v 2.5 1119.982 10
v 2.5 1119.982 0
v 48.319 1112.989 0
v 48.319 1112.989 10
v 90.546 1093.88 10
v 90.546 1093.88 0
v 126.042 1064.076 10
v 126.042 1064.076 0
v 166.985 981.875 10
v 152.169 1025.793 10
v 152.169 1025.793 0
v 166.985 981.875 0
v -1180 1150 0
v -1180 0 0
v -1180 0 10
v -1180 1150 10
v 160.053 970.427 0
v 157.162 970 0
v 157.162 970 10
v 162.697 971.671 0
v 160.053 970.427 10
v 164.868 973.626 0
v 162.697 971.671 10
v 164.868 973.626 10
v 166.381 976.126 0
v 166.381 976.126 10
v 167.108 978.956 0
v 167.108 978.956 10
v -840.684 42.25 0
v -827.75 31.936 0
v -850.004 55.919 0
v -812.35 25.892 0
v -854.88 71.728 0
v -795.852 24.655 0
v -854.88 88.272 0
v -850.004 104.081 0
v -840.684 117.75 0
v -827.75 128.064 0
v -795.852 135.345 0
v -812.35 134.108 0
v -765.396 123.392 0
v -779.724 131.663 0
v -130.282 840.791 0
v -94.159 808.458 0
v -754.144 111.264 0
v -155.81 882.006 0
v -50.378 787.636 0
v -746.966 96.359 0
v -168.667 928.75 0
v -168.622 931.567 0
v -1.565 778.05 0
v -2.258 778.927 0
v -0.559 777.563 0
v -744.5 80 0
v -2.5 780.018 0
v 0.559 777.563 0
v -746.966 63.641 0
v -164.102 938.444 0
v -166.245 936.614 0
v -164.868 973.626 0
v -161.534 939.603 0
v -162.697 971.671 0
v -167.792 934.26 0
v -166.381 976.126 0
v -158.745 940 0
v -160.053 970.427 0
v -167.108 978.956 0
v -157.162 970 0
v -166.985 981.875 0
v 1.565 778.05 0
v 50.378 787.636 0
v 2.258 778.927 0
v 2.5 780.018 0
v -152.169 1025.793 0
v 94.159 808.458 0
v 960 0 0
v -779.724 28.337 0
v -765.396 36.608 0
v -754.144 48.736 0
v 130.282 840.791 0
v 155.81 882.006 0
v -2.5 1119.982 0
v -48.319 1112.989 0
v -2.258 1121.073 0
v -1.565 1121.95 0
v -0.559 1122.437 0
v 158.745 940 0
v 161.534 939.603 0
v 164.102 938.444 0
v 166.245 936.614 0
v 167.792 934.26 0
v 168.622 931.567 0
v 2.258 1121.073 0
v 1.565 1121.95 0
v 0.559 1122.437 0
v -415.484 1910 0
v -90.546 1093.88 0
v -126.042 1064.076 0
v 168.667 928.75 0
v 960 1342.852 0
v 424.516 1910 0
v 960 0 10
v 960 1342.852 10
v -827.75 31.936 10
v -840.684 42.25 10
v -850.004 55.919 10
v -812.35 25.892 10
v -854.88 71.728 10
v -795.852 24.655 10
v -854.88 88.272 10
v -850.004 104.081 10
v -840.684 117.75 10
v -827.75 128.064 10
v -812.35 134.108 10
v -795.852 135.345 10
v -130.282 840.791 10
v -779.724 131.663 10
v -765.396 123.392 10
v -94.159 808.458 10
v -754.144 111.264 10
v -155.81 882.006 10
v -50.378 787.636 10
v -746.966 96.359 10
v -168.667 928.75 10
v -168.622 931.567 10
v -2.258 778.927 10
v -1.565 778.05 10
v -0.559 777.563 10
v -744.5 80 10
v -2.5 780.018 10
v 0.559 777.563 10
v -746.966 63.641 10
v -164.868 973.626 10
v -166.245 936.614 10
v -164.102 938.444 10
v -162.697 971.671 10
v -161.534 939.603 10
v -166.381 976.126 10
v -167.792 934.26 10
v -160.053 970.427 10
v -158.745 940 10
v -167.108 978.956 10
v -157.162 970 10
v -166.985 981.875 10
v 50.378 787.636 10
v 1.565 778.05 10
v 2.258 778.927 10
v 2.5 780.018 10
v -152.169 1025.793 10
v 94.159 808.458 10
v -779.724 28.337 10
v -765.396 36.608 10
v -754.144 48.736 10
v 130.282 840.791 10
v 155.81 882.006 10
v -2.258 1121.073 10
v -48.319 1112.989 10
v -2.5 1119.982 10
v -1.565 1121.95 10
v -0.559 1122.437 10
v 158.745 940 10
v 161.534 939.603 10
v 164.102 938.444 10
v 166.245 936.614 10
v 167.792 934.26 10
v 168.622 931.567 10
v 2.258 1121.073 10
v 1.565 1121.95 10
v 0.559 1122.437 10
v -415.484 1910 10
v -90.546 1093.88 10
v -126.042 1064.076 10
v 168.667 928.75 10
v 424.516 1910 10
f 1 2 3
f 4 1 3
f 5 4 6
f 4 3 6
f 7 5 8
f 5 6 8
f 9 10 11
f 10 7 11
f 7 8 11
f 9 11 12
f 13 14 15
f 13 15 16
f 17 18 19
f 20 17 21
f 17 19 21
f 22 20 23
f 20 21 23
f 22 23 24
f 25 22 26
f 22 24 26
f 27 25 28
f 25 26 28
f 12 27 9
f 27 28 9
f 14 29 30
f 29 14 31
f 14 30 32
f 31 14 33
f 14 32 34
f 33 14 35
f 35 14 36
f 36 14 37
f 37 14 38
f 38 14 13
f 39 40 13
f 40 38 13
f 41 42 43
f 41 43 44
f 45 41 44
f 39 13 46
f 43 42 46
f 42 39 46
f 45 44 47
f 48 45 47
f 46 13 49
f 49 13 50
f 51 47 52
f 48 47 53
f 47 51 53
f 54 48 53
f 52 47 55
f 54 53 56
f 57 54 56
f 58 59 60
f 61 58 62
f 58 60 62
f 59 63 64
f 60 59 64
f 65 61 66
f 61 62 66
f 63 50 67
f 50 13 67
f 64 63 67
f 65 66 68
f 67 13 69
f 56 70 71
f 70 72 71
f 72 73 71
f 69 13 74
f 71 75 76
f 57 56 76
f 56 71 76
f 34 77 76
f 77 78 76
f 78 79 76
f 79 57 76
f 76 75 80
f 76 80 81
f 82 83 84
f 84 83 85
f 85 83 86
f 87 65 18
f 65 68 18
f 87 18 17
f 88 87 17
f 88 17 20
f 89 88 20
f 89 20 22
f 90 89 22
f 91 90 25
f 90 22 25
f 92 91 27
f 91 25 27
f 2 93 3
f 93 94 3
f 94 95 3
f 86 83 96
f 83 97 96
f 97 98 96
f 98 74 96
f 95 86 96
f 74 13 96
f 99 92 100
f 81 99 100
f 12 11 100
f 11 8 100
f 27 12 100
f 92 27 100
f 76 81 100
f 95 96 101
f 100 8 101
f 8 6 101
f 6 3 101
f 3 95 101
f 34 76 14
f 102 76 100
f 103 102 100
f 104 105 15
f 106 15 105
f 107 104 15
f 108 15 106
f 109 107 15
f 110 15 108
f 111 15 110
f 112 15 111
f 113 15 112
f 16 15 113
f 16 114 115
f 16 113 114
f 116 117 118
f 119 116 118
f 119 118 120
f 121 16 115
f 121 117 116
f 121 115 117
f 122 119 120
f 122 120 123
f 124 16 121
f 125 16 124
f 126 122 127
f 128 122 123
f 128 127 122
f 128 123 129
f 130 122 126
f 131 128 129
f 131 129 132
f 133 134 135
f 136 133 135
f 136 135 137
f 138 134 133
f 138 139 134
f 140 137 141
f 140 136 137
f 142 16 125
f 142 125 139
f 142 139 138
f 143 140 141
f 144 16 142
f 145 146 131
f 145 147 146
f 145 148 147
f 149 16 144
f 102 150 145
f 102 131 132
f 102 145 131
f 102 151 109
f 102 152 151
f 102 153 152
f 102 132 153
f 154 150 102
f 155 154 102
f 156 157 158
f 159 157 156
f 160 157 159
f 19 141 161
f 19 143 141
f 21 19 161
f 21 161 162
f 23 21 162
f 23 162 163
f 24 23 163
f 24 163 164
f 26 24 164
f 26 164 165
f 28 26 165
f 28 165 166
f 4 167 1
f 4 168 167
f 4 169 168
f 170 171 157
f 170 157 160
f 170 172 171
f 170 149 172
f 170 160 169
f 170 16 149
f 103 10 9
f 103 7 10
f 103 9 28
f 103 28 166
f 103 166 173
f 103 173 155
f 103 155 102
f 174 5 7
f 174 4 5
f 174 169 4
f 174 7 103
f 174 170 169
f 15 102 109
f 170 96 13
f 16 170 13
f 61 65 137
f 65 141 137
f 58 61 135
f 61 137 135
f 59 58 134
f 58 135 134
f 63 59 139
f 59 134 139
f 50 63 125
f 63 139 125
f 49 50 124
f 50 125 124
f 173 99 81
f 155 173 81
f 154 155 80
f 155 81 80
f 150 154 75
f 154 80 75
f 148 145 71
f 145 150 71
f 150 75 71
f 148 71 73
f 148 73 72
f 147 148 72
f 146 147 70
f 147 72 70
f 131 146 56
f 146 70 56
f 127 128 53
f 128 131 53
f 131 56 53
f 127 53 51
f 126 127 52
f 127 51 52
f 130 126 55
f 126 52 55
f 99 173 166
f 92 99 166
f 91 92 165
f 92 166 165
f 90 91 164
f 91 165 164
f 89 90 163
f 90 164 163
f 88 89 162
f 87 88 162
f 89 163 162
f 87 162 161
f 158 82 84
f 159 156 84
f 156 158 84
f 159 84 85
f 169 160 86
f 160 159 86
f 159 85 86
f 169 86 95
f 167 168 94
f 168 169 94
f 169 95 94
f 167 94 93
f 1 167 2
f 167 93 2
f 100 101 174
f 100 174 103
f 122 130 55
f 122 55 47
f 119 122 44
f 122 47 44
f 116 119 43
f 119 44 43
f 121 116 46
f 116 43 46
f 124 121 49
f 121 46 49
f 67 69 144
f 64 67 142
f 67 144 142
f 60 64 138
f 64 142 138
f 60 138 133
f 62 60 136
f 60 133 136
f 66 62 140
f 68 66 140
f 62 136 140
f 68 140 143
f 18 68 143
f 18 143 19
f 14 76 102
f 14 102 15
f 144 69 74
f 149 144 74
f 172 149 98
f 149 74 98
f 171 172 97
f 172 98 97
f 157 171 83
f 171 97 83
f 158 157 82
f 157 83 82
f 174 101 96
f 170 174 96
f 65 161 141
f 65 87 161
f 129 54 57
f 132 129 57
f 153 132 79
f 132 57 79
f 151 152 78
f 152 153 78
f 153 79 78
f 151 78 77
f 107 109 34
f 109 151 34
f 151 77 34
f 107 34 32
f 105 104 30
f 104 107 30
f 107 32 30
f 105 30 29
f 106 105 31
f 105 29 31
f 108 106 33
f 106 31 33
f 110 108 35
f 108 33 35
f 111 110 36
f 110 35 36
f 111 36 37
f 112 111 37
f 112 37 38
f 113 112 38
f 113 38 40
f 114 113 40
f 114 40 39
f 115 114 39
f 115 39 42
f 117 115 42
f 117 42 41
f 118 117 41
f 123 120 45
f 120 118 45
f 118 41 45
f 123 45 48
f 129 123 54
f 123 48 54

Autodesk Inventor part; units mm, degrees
ref_plane "YZ Plane" through (0, 0, 0) normal (1, 0, 0) x (0, 1, 0)
ref_plane "XZ Plane" through (0, 0, 0) normal (0, 1, 0) x (-1, 0, 0)
ref_plane "XY Plane" through (0, 0, 0) normal (0, 0, 1) x (1, 0, 0)
sketch "Sketch1" plane through (0, 0, 0) normal (0, 0, 1) x (1, 0, 0)
  line L0 (0, 0) -> (0, 1910) construction
  line L1 (424.5155, 1910) -> (-415.4845, 1910)
  line L2 (-415.4845, 1910) -> (-1180, 1150)
  line L3 (-1180, 0) -> (-1180, 1150)
  line L4 (960, 0) -> (960, 1342.8524)
  line L5 (424.5155, 1910) -> (960, 1342.8524)
  circle A0 centre (0, 950) radius 265 construction
  line L6 (960, 0) -> (-1180, 0)
  circle A1 centre (-1701.6377, -269.2167) radius 188.5 construction
  circle A2 centre (-800, 80) radius 55.5
  circle A3 centre (0, 950) radius 170
  line L7 (0, 1215) -> (0, 1120) construction
  line L8 (-721.2646, 955) -> (721.2646, 955) construction
  line L9 (-169.9265, 955) -> (-174.9265, 955) construction
  line L10 (-174.9265, 960) -> (-174.9265, 950)
  line L11 (-174.9265, 960) -> (-169.7056, 960)
  line L12 (-174.9265, 950) -> (-170, 950)
  line L13 (169.9265, 955) -> (174.9265, 955) construction
  line L14 (174.9265, 960) -> (174.9265, 950)
  line L15 (169.7056, 960) -> (174.9265, 960)
  line L16 (174.9265, 950) -> (170, 950)
  line L17 (-174.9265, 970) -> (174.9265, 970)
  line L18 (174.9265, 970) -> (174.9265, 940)
  line L19 (174.9265, 940) -> (-174.9265, 940)
  line L20 (-174.9265, 940) -> (-174.9265, 970)
  arc A4 (-2.4999, 780.0184) -> (2.4999, 780.0184) centre (0, 780) ccw
  arc A5 (2.4999, 1119.9816) -> (-2.4999, 1119.9816) centre (0, 1120) ccw
  point P0 (0, 955)
  point P1 (-169.7056, 940)
  point P2 (169.7056, 940)
  point P3 (168.8194, 970)
  point P4 (-168.8194, 970)
  dimension "d52" = 530
  dimension "d72" = 340
  dimension "d1" = 840
  dimension "d3" = 1150
  dimension "d12" = 1180
  dimension "d13" = 950
  dimension "d14" = 111
  dimension "d15" = 1910
  dimension "d17" = -521.6377
  dimension "d18" = 377
  dimension "d19" = -269.2167
  dimension "d34" = 380
  dimension "d35" = 80
  dimension "d37" = 2140
  dimension "d53" = 5
  dimension "d54" = 10
  dimension "d55" = 30
  dimension "d67" = 5
  dimension "d68" = 5
  dimension "d69" = 780
  dimension "d71" = 1078
extrude "Extrusion1" add sketch "Sketch1" along normal blind 10 contours L5 L4 L6 L3 L2 L1 | A3 L19 L17 | L16 L18 L19 A3 | A3 L15 L14 L16 | A3 L17 L18 L15 | L19 L20 L12 A3 | A3 L11 L20 L17 | L12 L10 L11 A3
fillet "Fillet1" radius 10 4 edges at (-168.8194, 970, 5) (-169.7056, 940, 5) (168.8194, 970, 5) (169.7056, 940, 5)
sketch "Sketch4" plane through (0, 0, 0) normal (0, 0, 1) x (1, 0, 0)
  circle A0 centre (-51.6989, 1209.9081) radius 6.5
  arc A1 (-2.4999, 1119.9816) -> (-166.985, 981.875) centre (0, 950) ccw projected
  line L0 (0, 950) -> (0, 1196.7062) construction
  line L1 (-51.6989, 1209.9081) -> (0, 950) construction
  point P0 (0, 0)
  point P1 (-5, 1149.9375)
  dimension "d59" = 265
  dimension "d60" = 13
  dimension "d61" = 11.25
extrude "Extrusion4" [suppressed]
pattern_circular "Circular Pattern3" [suppressed]
properties part number "ДМФ 011 Стенка_Корма"
